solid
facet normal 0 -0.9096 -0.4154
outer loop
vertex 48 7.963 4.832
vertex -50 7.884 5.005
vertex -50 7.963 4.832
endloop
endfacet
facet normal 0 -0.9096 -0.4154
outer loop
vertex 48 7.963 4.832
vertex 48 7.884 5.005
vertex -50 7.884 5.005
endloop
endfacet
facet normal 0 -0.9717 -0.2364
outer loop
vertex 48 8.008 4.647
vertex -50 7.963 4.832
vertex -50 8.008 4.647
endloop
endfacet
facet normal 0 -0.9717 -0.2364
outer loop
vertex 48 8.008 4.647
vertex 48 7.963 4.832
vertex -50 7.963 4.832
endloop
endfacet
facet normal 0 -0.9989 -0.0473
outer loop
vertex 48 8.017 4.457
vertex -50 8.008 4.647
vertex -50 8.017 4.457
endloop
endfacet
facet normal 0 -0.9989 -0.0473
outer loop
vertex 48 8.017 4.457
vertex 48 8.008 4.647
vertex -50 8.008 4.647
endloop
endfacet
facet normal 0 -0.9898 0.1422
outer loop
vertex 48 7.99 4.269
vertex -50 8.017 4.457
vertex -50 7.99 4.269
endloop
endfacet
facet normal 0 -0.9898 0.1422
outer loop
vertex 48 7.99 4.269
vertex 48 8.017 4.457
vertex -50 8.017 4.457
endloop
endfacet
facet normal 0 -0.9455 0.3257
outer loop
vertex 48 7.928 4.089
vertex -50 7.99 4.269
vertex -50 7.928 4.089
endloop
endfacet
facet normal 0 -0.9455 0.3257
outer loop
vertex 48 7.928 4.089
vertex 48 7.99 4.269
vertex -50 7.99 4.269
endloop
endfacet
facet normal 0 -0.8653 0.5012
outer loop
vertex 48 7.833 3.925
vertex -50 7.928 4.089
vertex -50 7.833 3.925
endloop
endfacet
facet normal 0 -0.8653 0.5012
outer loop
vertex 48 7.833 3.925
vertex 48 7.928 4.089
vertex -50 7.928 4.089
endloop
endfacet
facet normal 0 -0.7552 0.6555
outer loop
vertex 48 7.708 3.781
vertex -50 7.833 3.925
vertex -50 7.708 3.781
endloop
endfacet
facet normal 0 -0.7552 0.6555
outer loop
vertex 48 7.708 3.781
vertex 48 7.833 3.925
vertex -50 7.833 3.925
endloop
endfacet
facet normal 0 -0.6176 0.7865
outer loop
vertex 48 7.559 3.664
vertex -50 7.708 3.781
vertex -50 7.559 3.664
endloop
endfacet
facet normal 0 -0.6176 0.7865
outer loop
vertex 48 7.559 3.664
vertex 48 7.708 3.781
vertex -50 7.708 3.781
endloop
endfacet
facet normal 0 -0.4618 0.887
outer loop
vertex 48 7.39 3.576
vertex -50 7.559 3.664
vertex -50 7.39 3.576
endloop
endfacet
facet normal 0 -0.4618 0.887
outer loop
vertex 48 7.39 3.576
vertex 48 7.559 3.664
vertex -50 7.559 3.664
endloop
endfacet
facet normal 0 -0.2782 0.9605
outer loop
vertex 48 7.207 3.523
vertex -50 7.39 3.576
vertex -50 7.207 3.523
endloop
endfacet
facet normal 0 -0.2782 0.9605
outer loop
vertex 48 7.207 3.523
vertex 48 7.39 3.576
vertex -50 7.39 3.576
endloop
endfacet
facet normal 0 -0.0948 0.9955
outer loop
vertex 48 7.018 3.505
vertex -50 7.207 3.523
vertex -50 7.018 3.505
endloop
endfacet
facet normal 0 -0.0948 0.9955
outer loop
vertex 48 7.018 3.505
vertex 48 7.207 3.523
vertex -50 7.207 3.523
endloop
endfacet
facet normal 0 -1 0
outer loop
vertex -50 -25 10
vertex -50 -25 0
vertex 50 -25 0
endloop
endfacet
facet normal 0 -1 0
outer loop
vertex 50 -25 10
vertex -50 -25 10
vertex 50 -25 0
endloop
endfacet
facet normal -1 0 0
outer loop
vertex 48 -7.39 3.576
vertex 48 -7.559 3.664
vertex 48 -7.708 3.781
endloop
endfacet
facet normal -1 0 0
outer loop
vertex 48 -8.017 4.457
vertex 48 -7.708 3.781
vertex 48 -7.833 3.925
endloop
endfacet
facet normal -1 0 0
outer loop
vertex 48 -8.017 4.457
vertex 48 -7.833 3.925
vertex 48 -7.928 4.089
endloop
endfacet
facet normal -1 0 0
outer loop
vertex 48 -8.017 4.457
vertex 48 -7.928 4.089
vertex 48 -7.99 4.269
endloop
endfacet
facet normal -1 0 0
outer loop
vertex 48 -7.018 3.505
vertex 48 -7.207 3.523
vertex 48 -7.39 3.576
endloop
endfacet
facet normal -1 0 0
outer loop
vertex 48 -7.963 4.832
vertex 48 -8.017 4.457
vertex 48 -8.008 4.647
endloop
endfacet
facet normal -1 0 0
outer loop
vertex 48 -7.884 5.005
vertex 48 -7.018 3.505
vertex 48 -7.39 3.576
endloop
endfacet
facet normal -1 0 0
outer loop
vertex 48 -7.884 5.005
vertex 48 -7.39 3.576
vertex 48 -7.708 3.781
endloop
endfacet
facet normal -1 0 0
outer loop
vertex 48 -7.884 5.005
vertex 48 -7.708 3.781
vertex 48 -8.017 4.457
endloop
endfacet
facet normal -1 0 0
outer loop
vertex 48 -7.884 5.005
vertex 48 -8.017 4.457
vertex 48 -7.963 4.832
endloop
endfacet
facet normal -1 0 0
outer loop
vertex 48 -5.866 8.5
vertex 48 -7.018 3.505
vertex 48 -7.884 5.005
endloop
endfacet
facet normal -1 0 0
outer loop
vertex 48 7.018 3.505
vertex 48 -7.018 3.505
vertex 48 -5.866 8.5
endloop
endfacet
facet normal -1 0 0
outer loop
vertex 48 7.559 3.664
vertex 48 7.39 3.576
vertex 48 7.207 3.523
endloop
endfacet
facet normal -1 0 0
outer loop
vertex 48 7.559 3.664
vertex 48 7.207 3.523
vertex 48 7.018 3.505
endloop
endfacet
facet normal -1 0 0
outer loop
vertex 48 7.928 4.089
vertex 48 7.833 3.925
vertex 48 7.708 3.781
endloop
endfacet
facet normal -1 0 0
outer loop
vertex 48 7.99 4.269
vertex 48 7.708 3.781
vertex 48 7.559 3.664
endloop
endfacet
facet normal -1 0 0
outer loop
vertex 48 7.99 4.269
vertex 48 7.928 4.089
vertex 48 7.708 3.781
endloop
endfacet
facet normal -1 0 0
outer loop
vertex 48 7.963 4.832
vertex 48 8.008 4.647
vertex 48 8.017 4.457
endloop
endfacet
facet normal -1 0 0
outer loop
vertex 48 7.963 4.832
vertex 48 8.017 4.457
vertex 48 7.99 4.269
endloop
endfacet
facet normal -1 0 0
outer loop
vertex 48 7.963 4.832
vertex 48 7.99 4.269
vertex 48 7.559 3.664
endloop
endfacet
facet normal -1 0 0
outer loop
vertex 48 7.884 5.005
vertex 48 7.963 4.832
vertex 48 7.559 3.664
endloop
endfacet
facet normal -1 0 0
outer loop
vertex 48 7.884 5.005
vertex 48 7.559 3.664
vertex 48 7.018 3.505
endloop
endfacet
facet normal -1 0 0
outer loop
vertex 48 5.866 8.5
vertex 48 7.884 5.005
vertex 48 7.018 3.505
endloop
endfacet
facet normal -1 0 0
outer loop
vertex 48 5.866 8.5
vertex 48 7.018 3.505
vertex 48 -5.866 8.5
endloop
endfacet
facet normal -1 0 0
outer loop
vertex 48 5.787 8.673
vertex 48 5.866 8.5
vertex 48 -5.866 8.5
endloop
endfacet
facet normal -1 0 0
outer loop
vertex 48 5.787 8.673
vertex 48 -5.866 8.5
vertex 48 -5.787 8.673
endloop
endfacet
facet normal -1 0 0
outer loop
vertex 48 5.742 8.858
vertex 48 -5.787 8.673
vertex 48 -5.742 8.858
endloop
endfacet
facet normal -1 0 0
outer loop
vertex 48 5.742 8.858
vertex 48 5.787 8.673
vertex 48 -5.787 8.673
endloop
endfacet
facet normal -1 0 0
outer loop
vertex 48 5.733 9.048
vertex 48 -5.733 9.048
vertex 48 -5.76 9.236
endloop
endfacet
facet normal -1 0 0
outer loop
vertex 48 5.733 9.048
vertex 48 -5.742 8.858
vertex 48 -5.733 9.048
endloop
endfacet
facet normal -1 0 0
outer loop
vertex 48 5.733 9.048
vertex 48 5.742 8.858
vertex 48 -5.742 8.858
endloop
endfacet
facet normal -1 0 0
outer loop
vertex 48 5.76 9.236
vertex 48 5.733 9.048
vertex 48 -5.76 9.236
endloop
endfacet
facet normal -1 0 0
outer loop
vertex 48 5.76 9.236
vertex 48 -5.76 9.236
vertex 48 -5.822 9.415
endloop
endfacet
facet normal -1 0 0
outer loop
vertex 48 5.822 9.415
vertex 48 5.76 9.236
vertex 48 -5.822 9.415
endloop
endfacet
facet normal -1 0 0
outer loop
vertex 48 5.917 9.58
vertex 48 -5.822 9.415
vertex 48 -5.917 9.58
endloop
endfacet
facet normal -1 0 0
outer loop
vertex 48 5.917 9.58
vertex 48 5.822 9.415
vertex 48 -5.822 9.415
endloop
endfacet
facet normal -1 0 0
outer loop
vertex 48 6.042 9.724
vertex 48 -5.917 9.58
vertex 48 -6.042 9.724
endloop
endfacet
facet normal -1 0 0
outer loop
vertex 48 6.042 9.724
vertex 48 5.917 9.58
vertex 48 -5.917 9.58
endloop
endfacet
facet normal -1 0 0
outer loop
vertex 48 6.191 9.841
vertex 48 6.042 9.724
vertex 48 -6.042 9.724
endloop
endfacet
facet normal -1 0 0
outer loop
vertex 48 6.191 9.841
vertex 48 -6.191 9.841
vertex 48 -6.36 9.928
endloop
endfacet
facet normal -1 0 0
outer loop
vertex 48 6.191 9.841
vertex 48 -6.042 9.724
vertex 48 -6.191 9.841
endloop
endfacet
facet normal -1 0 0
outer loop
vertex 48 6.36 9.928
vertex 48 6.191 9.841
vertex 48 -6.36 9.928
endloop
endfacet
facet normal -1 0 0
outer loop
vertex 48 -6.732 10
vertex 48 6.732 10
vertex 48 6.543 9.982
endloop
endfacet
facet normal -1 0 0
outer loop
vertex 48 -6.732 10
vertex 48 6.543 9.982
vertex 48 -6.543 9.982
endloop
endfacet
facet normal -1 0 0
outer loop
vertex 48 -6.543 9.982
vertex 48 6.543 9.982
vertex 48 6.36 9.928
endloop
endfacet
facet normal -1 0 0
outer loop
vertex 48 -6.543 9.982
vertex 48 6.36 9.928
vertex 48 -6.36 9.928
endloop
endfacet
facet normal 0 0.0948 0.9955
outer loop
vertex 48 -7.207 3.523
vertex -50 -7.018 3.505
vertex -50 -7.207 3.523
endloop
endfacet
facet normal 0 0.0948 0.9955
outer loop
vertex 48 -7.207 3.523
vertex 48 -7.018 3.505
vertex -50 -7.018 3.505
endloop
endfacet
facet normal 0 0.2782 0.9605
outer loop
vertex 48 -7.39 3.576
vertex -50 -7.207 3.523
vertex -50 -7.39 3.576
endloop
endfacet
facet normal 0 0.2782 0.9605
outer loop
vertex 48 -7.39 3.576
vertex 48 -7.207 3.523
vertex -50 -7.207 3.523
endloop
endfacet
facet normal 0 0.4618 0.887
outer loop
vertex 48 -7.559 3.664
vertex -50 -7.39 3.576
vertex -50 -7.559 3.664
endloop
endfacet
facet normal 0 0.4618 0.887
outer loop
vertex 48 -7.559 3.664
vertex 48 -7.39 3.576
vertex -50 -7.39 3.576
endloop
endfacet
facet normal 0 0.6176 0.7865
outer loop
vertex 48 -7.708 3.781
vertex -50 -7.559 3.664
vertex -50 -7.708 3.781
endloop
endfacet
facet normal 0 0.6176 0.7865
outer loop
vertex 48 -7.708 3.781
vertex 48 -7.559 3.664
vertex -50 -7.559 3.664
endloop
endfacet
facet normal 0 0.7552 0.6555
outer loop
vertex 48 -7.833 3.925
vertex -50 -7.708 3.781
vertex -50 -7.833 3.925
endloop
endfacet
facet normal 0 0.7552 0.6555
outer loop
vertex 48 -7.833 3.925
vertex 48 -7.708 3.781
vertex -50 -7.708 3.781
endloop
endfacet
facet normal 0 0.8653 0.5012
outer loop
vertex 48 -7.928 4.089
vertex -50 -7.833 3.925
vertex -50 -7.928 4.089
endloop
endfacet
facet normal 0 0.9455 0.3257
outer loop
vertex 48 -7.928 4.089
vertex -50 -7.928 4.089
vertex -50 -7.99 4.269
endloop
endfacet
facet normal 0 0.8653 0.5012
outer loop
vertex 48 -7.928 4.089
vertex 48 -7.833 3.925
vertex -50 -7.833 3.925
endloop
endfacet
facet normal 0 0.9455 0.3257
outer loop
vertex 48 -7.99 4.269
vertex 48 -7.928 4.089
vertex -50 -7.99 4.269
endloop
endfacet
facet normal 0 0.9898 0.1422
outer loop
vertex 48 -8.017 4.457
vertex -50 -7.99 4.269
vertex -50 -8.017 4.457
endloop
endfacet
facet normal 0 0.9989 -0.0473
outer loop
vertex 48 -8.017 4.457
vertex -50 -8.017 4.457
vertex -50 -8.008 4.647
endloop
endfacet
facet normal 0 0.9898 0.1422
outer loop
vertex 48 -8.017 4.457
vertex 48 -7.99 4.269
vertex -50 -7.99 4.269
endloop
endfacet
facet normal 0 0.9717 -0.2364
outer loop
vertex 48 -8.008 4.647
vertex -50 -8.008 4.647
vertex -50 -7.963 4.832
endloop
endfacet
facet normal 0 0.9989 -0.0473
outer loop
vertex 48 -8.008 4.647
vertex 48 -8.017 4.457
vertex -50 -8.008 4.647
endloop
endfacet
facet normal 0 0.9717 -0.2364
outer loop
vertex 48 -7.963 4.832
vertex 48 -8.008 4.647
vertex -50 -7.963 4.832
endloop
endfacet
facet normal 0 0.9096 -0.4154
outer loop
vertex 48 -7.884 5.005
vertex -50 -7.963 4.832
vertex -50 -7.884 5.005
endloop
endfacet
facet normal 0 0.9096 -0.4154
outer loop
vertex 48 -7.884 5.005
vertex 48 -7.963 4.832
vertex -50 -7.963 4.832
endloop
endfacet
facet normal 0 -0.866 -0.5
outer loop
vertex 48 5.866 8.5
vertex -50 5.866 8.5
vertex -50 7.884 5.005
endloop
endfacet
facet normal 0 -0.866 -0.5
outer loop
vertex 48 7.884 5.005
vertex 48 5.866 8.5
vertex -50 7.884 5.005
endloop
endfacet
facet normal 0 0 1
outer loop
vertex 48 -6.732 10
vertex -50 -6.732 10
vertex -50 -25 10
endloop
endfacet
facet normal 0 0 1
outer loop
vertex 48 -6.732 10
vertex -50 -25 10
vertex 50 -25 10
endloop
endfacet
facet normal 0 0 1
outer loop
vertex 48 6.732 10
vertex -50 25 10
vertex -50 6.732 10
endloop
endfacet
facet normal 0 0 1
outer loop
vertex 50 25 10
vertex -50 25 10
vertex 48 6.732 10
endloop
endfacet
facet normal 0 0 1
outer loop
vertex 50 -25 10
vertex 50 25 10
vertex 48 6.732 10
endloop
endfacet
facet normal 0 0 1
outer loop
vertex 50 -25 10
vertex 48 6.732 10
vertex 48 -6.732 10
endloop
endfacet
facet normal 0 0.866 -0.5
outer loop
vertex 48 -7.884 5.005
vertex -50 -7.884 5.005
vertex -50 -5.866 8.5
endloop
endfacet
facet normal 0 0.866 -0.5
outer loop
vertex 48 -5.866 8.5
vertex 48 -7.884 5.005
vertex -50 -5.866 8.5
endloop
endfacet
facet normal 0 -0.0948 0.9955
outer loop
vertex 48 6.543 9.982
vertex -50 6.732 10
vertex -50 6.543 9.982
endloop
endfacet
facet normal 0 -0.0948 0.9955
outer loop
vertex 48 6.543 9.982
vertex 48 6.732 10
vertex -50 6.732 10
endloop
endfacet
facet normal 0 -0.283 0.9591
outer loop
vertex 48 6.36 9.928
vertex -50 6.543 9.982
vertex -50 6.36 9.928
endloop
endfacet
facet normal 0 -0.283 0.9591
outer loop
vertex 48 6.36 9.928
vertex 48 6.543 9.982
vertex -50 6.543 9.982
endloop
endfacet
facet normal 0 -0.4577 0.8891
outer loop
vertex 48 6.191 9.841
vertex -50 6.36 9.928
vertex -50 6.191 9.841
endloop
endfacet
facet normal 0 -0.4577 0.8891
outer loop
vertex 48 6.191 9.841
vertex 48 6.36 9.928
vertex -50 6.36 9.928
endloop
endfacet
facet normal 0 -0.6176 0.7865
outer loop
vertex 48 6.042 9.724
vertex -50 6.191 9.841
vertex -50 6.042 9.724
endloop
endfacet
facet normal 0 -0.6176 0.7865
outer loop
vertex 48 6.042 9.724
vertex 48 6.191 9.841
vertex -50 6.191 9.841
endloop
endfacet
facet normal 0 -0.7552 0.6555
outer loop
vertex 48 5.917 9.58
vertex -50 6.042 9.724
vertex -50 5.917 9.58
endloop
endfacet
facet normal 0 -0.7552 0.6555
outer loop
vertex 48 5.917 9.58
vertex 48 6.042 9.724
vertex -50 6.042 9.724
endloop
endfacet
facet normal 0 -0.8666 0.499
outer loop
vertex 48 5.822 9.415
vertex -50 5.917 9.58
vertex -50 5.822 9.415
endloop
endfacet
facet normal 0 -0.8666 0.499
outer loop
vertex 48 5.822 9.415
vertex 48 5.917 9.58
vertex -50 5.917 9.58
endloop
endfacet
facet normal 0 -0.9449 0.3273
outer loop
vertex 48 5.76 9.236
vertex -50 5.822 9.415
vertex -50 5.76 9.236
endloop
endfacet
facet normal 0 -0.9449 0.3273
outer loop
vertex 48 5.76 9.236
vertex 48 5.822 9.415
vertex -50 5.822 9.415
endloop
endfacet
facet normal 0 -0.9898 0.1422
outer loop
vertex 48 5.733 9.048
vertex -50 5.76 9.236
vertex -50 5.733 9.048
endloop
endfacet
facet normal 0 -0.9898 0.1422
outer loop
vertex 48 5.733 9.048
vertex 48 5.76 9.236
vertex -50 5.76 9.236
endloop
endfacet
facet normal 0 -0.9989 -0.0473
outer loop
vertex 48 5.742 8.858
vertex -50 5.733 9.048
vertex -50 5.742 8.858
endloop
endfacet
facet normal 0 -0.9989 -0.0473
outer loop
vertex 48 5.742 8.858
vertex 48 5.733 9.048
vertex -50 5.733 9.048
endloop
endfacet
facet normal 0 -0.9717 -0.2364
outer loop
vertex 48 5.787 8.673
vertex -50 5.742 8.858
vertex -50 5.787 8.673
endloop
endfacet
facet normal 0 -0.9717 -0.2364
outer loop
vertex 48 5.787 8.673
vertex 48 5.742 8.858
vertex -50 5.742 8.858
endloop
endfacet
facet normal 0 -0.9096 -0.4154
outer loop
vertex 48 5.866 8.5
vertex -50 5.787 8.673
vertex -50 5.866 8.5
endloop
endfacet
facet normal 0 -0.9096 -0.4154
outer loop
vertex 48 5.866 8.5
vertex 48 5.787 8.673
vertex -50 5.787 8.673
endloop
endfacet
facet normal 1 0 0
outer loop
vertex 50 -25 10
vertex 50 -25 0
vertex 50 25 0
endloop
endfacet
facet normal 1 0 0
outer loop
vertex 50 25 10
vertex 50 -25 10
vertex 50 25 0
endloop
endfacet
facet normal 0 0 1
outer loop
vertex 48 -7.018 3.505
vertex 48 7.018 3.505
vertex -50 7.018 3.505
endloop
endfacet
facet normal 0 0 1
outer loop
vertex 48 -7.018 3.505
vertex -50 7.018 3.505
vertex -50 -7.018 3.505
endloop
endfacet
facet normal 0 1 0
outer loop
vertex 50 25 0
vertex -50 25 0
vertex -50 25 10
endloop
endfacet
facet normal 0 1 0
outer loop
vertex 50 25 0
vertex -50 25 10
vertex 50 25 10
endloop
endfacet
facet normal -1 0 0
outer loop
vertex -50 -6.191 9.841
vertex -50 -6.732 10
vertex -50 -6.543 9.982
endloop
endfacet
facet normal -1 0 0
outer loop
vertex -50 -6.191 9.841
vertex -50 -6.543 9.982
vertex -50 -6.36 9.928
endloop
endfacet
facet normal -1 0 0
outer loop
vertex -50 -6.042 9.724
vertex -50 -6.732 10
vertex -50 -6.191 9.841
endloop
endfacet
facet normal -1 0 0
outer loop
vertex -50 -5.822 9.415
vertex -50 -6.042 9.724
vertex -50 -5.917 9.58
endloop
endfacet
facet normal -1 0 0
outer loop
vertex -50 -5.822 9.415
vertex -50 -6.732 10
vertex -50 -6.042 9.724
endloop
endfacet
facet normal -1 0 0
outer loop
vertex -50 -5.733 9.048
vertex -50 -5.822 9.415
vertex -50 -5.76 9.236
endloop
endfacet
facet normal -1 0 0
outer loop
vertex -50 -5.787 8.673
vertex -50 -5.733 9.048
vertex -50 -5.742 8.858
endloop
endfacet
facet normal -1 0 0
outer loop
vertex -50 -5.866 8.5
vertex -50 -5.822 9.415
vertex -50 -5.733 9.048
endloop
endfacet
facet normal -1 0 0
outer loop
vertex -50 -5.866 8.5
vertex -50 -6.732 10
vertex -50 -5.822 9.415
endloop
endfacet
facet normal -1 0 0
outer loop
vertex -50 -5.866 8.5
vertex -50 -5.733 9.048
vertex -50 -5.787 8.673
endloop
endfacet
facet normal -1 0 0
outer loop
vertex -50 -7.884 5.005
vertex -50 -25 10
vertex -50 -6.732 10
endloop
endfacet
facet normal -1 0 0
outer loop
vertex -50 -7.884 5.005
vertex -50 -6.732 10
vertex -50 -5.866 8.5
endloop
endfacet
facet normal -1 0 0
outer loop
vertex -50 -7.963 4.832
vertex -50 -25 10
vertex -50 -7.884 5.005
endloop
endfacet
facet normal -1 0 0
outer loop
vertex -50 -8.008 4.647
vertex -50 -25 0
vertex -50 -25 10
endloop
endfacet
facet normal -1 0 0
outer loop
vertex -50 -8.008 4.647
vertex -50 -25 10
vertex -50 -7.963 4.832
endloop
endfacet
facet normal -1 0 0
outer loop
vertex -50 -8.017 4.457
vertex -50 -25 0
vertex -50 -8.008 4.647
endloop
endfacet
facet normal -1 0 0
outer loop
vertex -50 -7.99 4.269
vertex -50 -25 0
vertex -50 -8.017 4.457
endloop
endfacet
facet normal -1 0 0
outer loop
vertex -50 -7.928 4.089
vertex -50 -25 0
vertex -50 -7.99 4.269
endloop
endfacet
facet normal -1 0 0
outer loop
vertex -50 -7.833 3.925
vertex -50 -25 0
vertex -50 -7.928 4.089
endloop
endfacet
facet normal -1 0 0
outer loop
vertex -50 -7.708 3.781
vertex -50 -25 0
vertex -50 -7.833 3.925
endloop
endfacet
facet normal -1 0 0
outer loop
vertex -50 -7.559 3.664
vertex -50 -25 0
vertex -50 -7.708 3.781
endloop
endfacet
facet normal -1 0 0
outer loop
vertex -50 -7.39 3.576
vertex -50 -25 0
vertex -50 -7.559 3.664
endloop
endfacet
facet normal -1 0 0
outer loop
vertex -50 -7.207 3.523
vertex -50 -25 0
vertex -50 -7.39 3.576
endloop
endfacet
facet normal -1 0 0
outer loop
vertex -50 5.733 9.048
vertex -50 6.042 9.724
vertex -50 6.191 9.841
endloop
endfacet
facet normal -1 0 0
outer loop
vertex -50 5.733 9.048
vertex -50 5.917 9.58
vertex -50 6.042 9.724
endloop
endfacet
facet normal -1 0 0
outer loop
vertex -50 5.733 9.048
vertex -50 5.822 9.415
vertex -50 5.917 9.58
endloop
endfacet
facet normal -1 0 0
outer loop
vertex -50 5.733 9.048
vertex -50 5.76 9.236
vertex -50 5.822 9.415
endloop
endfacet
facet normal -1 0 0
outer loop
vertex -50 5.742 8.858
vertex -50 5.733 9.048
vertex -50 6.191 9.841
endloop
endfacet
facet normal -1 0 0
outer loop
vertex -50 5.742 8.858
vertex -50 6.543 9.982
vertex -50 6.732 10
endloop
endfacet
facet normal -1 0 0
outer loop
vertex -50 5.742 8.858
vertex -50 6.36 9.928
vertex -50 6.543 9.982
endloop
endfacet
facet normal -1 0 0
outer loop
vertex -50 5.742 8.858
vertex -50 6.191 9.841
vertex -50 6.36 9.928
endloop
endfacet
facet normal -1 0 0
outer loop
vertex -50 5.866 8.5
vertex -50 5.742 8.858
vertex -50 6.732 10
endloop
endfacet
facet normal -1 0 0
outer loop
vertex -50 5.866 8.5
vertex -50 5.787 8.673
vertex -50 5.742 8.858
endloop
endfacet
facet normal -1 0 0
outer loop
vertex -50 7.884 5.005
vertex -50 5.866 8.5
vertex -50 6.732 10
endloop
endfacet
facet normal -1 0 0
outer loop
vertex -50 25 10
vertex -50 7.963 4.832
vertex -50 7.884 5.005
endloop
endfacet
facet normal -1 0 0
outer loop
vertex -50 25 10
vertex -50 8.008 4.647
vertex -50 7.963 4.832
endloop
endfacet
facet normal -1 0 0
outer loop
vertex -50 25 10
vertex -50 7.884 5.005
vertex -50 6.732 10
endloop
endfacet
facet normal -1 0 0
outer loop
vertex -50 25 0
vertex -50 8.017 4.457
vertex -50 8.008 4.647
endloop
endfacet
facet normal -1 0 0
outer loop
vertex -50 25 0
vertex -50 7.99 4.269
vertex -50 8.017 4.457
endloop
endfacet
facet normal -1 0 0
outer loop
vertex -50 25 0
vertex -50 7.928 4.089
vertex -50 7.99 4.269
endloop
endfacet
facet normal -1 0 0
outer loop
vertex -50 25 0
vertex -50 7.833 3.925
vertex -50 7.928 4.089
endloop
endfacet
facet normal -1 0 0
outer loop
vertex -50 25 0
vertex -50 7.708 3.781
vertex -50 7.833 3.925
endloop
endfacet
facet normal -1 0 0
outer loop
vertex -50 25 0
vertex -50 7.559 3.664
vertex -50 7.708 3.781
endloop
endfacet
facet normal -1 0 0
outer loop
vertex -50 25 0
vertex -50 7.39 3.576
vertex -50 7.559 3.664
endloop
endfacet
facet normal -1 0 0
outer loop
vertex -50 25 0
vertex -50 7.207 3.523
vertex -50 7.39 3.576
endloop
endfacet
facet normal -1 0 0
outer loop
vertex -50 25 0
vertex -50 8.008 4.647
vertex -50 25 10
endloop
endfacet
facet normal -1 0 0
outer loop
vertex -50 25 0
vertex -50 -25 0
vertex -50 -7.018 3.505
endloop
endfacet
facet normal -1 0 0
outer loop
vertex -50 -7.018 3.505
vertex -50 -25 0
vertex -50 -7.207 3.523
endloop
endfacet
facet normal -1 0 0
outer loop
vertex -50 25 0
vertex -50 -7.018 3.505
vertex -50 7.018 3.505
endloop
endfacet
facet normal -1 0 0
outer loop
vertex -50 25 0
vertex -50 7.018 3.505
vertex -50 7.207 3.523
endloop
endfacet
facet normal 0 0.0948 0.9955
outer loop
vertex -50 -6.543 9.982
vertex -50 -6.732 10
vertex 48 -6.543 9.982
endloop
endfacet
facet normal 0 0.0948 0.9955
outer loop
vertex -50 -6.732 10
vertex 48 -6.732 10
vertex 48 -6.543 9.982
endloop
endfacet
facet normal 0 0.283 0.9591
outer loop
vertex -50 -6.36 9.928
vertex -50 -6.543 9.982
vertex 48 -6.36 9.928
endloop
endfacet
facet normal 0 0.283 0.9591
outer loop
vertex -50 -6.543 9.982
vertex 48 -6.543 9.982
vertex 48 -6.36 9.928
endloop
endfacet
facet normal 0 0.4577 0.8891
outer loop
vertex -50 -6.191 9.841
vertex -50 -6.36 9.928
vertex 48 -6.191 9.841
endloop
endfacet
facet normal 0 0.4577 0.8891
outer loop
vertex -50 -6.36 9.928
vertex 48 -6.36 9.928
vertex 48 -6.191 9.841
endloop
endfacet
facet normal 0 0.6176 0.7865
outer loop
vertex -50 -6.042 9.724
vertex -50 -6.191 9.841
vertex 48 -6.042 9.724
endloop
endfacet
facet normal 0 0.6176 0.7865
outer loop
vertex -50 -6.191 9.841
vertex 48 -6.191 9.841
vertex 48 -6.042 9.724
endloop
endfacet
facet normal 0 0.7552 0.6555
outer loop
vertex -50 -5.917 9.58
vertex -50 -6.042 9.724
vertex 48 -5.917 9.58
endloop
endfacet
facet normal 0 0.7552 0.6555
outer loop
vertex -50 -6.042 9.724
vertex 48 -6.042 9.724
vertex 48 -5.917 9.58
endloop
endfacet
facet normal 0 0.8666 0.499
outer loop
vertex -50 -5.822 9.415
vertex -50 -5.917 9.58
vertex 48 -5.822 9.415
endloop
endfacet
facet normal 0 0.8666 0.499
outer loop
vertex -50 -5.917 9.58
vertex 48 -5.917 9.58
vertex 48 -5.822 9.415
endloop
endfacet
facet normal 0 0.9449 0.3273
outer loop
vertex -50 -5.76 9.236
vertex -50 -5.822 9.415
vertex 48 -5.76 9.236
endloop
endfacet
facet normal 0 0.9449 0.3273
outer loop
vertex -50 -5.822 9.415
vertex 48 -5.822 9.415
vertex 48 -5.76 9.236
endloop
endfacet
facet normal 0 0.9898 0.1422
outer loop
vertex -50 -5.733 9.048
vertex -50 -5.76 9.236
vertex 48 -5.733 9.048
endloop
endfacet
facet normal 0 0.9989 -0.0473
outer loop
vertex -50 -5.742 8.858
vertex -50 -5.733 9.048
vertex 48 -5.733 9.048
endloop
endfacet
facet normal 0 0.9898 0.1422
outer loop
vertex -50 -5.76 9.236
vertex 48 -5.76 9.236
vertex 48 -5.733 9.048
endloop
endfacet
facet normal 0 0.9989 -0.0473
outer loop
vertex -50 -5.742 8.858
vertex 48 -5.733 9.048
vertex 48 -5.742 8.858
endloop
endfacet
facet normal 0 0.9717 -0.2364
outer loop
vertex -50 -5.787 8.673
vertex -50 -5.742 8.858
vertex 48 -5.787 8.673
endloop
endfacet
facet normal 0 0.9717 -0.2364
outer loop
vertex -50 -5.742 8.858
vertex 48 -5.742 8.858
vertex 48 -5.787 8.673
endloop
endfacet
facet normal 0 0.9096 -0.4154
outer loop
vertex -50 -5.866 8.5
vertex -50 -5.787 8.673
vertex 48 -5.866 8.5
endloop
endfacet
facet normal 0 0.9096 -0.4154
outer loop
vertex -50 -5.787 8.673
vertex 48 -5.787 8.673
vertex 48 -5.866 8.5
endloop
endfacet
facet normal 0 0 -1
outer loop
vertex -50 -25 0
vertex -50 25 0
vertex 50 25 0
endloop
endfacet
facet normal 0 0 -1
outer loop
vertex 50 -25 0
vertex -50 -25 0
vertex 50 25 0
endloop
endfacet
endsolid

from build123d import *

# Parameters (mm, degrees)
IZIM1_W                     = 100
IZIM1_H                     = 50
Y_KSEKLIK_EKSTR_ZYON1_DEPTH = 10
KES_EKSTR_ZYON1_DEPTH       = 98
RADYUS1_R                   = 1


with BuildPart() as part:
    # Çizim1 → Yükseklik-Ekstrüzyon1 (new body)
    with BuildSketch(Plane.XY):
        Rectangle(IZIM1_W, IZIM1_H)
    extrude(amount=Y_KSEKLIK_EKSTR_ZYON1_DEPTH)

    # Çizim2 → Kes-Ekstrüzyon1 (cut)
    with BuildSketch(Plane.ZY.offset(50)):
        Polygon((10, 5), (3.504809472, 8.75), (3.504809472, -8.75), (10, -5), align=None)
    extrude(amount=-KES_EKSTR_ZYON1_DEPTH, mode=Mode.SUBTRACT)

    # Radyus1
    radyus1_edges = [part.edges().sort_by_distance(p)[0] for p in [
        (-1, 5, 10),
        (-1, -5, 10),
        (-1, -8.75, 3.504809472),
        (-1, 8.75, 3.504809472),
    ]]
    fillet(radyus1_edges, radius=RADYUS1_R)


solid = part.part
